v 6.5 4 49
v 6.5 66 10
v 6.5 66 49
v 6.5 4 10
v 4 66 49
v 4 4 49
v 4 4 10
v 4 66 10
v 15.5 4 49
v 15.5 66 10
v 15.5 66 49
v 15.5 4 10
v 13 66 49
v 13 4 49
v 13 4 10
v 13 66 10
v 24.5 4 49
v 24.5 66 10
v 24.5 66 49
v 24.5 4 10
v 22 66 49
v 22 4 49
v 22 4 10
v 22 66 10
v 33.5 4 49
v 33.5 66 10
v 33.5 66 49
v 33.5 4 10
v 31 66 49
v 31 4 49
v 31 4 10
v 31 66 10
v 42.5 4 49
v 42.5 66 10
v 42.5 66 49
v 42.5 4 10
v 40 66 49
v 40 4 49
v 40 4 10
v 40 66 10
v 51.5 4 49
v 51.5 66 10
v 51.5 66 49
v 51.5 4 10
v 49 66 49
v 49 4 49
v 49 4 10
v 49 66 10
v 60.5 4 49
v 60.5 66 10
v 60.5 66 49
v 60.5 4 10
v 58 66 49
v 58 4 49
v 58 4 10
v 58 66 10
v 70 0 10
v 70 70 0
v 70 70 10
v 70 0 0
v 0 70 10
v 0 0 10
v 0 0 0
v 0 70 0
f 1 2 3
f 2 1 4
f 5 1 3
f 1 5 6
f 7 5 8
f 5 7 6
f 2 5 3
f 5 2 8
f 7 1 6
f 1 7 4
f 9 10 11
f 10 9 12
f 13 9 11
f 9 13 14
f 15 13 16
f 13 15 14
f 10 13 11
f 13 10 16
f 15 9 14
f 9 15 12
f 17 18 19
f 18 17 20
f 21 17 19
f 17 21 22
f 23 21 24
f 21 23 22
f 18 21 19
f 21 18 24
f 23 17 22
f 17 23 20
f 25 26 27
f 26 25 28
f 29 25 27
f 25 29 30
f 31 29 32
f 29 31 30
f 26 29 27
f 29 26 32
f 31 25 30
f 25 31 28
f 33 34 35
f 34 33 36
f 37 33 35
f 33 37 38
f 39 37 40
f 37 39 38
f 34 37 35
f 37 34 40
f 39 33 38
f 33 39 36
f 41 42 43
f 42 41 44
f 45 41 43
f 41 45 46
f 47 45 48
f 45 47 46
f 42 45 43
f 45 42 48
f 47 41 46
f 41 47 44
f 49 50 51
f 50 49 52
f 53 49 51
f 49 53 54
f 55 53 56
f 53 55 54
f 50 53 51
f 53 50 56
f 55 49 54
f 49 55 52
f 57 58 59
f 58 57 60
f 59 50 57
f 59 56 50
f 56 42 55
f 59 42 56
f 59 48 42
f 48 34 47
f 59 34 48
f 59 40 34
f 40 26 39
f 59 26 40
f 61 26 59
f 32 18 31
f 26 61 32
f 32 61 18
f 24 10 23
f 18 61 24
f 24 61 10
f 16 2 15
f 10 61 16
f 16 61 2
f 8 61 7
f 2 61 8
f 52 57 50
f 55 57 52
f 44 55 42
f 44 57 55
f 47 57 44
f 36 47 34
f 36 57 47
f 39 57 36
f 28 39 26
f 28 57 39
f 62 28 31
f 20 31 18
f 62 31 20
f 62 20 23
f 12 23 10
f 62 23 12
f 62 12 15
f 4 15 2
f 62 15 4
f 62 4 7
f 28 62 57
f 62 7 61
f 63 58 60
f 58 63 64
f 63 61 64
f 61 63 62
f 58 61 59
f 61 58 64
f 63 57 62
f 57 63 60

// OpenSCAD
$fn = 32;

// ----------------------------------------------------------------------
// Heatsink: uniform fin block
// ----------------------------------------------------------------------

// --- parameters (mm) ---
base_l = 70;              // base length, X
base_w = 70;              // base width, Y
base_t = 10;              // base plate thickness
fin_h = 40;               // fin height above the base
fin_t = 2.5;              // fin thickness
edge = 4;                 // margin from the base ends
pitch = 9;                // fin pitch

n_fins = floor((base_l - 2 * edge - fin_t) / pitch) + 1;  // fin count
total_h = base_t + fin_h - 1;  // overall height

union() {
  cube([base_l, base_w, base_t]);
  for (i = [0 : n_fins - 1])
    translate([edge + i * pitch, edge, base_t - 1])
      cube([fin_t, base_w - 2 * edge, fin_h]);
}
